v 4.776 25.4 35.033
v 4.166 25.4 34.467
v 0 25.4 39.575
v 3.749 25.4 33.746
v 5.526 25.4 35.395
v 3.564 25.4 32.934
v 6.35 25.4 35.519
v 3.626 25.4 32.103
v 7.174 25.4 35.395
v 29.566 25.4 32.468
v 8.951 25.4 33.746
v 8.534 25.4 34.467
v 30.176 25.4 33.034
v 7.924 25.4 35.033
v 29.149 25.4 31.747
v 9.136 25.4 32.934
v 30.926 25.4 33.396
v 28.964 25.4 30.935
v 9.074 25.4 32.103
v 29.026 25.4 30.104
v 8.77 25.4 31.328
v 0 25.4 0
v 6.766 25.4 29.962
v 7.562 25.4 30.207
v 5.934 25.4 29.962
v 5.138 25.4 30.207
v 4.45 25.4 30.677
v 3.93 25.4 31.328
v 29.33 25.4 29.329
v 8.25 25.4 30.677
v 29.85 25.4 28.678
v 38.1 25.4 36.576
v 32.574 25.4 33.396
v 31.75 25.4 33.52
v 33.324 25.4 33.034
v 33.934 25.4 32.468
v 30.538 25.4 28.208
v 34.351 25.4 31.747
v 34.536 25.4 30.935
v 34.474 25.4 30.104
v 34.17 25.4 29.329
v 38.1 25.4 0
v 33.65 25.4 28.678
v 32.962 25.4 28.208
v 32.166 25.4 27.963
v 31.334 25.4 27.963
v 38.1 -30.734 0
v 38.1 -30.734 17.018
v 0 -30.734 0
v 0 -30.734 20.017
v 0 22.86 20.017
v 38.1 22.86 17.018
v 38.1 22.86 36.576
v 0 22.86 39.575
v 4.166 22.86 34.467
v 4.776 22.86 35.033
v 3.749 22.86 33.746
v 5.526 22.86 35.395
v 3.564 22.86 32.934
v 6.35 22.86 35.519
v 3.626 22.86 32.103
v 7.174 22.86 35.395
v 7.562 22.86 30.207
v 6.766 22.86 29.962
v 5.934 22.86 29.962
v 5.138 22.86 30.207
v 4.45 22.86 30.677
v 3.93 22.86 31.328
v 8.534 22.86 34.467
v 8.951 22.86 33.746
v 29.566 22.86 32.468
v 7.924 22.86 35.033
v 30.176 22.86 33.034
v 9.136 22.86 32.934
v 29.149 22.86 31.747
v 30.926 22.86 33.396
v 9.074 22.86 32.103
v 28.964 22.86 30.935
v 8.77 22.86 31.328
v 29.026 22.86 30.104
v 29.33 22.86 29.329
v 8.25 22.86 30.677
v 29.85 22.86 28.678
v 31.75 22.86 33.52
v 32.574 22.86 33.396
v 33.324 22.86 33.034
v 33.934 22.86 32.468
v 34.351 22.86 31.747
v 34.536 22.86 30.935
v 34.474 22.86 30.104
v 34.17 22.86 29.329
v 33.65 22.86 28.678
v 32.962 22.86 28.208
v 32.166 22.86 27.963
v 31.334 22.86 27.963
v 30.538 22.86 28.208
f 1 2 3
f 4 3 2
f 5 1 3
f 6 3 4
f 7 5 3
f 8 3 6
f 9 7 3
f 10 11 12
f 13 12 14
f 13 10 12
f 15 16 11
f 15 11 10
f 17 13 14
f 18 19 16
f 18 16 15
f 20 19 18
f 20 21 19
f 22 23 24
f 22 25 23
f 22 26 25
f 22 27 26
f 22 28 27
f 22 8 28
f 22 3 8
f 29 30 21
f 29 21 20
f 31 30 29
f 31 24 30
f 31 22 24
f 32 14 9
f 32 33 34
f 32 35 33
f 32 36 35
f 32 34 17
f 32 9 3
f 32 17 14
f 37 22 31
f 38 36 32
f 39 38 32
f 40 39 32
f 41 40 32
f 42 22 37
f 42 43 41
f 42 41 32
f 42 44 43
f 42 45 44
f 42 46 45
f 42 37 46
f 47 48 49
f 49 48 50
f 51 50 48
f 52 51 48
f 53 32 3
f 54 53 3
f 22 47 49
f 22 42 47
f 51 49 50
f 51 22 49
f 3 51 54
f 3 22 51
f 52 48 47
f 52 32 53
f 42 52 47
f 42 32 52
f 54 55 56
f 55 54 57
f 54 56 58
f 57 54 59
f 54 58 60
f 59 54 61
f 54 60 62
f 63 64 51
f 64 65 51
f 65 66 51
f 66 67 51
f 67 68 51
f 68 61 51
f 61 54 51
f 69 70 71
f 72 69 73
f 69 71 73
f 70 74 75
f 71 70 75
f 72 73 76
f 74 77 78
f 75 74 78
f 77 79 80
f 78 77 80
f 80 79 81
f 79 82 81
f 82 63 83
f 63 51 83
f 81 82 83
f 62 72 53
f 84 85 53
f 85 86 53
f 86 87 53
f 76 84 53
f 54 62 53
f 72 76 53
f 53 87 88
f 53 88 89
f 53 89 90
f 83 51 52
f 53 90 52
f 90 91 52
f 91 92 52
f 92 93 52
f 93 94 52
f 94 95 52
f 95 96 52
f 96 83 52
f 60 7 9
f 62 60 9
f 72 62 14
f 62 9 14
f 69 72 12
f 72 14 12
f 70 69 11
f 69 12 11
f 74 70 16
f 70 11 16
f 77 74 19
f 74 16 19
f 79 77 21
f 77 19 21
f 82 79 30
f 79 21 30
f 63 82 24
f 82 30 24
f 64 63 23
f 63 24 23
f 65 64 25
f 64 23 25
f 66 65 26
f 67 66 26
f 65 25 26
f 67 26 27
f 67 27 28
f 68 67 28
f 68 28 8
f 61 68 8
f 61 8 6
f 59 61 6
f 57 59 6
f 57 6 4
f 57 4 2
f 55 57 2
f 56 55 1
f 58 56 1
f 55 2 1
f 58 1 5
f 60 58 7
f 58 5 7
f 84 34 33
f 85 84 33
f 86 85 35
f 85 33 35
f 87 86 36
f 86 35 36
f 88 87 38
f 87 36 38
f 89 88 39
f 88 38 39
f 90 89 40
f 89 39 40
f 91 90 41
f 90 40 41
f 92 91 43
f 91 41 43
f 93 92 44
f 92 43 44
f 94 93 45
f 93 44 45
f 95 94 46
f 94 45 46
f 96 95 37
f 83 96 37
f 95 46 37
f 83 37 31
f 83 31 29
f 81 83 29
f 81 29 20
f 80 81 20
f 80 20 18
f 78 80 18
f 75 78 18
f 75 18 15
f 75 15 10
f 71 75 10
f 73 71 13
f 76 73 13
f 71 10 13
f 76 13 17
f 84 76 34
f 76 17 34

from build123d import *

# Parameters (mm, degrees)
SKETCH1_W           = 38.1
SKETCH1_H           = 25.4
BOSS_EXTRUDE1_DEPTH = 17.018
SKETCH4_W           = 38.1
SKETCH4_H           = 23.368
SKETCH4_R           = 2.794
BOSS_EXTRUDE2_DEPTH = 2.54
CUT_EXTRUDE1_DEPTH  = 62.055704041
BOSS_EXTRUDE3_DEPTH = 22.86
BOSS_EXTRUDE5_DEPTH = 30.734
SKETCH11_R          = 2.0193
CUT_EXTRUDE3_DEPTH  = 30.734
BOSS_EXTRUDE4_DEPTH = 30.734


with BuildPart() as part:
    # Sketch1 → Boss-Extrude1 (new body)
    with BuildSketch(Plane.XY):
        with Locations((19.05, 12.7)):
            Rectangle(SKETCH1_W, SKETCH1_H)
    extrude(amount=BOSS_EXTRUDE1_DEPTH)

    # Sketch4 → Boss-Extrude2 (add)
    with BuildSketch(Plane(origin=(0, 25.4, 0), x_dir=(1, 0, 0), z_dir=(0, 1, 0))):
        with Locations((19.05, -28.702)):
            Rectangle(SKETCH4_W, SKETCH4_H)
        with Locations(Location((6.35, -32.724779192, 0), (0, 0, 270))):
            Circle(SKETCH4_R, mode=Mode.SUBTRACT)
        with Locations(Location((31.75, -30.725755838, 0), (0, 0, 270))):
            Circle(SKETCH4_R, mode=Mode.SUBTRACT)
    extrude(amount=-BOSS_EXTRUDE2_DEPTH)

    # Sketch5 → Cut-Extrude1 (cut, through all)
    with BuildSketch(Plane(origin=(0, 25.4, 0), x_dir=(1, 0, 0), z_dir=(0, 1, 0))):
        Polygon((38.1, -36.576), (0, -39.57453503), (0, -40.386), (38.1, -40.386), align=None)
    extrude(amount=-CUT_EXTRUDE1_DEPTH, mode=Mode.SUBTRACT)

    # Sketch7 → Boss-Extrude3 (add)
    with BuildSketch(Plane.XZ):
        Polygon((38.1, 17.018), (0, 20.01653503), (0, 17.018), align=None)
    extrude(amount=-BOSS_EXTRUDE3_DEPTH)

    # Sketch10 → Boss-Extrude5 (add)
    with BuildSketch(Plane.XZ):
        Polygon((0, 0), (0, 20.01653503), (38.1, 17.018), (38.1, 0), align=None)
    extrude(amount=BOSS_EXTRUDE5_DEPTH)

    # Sketch11 → Cut-Extrude3 (cut)
    with BuildSketch(Plane(origin=(0, 0, 0), x_dir=(-1, 0, 0), z_dir=(0, 0, -1))):
        with Locations((-25.4, -2.794)):
            Circle(SKETCH11_R)
        with Locations((-12.7, -2.794)):
            Circle(SKETCH11_R)
    extrude(amount=-CUT_EXTRUDE3_DEPTH, mode=Mode.SUBTRACT)

    # Sketch9 → Boss-Extrude4 (add)
    with BuildSketch(Plane.XZ):
        Polygon((0, 0), (38.1, 0), (38.1, 17.018), (0, 20.01653503), align=None)
    extrude(amount=BOSS_EXTRUDE4_DEPTH)


solid = part.part
